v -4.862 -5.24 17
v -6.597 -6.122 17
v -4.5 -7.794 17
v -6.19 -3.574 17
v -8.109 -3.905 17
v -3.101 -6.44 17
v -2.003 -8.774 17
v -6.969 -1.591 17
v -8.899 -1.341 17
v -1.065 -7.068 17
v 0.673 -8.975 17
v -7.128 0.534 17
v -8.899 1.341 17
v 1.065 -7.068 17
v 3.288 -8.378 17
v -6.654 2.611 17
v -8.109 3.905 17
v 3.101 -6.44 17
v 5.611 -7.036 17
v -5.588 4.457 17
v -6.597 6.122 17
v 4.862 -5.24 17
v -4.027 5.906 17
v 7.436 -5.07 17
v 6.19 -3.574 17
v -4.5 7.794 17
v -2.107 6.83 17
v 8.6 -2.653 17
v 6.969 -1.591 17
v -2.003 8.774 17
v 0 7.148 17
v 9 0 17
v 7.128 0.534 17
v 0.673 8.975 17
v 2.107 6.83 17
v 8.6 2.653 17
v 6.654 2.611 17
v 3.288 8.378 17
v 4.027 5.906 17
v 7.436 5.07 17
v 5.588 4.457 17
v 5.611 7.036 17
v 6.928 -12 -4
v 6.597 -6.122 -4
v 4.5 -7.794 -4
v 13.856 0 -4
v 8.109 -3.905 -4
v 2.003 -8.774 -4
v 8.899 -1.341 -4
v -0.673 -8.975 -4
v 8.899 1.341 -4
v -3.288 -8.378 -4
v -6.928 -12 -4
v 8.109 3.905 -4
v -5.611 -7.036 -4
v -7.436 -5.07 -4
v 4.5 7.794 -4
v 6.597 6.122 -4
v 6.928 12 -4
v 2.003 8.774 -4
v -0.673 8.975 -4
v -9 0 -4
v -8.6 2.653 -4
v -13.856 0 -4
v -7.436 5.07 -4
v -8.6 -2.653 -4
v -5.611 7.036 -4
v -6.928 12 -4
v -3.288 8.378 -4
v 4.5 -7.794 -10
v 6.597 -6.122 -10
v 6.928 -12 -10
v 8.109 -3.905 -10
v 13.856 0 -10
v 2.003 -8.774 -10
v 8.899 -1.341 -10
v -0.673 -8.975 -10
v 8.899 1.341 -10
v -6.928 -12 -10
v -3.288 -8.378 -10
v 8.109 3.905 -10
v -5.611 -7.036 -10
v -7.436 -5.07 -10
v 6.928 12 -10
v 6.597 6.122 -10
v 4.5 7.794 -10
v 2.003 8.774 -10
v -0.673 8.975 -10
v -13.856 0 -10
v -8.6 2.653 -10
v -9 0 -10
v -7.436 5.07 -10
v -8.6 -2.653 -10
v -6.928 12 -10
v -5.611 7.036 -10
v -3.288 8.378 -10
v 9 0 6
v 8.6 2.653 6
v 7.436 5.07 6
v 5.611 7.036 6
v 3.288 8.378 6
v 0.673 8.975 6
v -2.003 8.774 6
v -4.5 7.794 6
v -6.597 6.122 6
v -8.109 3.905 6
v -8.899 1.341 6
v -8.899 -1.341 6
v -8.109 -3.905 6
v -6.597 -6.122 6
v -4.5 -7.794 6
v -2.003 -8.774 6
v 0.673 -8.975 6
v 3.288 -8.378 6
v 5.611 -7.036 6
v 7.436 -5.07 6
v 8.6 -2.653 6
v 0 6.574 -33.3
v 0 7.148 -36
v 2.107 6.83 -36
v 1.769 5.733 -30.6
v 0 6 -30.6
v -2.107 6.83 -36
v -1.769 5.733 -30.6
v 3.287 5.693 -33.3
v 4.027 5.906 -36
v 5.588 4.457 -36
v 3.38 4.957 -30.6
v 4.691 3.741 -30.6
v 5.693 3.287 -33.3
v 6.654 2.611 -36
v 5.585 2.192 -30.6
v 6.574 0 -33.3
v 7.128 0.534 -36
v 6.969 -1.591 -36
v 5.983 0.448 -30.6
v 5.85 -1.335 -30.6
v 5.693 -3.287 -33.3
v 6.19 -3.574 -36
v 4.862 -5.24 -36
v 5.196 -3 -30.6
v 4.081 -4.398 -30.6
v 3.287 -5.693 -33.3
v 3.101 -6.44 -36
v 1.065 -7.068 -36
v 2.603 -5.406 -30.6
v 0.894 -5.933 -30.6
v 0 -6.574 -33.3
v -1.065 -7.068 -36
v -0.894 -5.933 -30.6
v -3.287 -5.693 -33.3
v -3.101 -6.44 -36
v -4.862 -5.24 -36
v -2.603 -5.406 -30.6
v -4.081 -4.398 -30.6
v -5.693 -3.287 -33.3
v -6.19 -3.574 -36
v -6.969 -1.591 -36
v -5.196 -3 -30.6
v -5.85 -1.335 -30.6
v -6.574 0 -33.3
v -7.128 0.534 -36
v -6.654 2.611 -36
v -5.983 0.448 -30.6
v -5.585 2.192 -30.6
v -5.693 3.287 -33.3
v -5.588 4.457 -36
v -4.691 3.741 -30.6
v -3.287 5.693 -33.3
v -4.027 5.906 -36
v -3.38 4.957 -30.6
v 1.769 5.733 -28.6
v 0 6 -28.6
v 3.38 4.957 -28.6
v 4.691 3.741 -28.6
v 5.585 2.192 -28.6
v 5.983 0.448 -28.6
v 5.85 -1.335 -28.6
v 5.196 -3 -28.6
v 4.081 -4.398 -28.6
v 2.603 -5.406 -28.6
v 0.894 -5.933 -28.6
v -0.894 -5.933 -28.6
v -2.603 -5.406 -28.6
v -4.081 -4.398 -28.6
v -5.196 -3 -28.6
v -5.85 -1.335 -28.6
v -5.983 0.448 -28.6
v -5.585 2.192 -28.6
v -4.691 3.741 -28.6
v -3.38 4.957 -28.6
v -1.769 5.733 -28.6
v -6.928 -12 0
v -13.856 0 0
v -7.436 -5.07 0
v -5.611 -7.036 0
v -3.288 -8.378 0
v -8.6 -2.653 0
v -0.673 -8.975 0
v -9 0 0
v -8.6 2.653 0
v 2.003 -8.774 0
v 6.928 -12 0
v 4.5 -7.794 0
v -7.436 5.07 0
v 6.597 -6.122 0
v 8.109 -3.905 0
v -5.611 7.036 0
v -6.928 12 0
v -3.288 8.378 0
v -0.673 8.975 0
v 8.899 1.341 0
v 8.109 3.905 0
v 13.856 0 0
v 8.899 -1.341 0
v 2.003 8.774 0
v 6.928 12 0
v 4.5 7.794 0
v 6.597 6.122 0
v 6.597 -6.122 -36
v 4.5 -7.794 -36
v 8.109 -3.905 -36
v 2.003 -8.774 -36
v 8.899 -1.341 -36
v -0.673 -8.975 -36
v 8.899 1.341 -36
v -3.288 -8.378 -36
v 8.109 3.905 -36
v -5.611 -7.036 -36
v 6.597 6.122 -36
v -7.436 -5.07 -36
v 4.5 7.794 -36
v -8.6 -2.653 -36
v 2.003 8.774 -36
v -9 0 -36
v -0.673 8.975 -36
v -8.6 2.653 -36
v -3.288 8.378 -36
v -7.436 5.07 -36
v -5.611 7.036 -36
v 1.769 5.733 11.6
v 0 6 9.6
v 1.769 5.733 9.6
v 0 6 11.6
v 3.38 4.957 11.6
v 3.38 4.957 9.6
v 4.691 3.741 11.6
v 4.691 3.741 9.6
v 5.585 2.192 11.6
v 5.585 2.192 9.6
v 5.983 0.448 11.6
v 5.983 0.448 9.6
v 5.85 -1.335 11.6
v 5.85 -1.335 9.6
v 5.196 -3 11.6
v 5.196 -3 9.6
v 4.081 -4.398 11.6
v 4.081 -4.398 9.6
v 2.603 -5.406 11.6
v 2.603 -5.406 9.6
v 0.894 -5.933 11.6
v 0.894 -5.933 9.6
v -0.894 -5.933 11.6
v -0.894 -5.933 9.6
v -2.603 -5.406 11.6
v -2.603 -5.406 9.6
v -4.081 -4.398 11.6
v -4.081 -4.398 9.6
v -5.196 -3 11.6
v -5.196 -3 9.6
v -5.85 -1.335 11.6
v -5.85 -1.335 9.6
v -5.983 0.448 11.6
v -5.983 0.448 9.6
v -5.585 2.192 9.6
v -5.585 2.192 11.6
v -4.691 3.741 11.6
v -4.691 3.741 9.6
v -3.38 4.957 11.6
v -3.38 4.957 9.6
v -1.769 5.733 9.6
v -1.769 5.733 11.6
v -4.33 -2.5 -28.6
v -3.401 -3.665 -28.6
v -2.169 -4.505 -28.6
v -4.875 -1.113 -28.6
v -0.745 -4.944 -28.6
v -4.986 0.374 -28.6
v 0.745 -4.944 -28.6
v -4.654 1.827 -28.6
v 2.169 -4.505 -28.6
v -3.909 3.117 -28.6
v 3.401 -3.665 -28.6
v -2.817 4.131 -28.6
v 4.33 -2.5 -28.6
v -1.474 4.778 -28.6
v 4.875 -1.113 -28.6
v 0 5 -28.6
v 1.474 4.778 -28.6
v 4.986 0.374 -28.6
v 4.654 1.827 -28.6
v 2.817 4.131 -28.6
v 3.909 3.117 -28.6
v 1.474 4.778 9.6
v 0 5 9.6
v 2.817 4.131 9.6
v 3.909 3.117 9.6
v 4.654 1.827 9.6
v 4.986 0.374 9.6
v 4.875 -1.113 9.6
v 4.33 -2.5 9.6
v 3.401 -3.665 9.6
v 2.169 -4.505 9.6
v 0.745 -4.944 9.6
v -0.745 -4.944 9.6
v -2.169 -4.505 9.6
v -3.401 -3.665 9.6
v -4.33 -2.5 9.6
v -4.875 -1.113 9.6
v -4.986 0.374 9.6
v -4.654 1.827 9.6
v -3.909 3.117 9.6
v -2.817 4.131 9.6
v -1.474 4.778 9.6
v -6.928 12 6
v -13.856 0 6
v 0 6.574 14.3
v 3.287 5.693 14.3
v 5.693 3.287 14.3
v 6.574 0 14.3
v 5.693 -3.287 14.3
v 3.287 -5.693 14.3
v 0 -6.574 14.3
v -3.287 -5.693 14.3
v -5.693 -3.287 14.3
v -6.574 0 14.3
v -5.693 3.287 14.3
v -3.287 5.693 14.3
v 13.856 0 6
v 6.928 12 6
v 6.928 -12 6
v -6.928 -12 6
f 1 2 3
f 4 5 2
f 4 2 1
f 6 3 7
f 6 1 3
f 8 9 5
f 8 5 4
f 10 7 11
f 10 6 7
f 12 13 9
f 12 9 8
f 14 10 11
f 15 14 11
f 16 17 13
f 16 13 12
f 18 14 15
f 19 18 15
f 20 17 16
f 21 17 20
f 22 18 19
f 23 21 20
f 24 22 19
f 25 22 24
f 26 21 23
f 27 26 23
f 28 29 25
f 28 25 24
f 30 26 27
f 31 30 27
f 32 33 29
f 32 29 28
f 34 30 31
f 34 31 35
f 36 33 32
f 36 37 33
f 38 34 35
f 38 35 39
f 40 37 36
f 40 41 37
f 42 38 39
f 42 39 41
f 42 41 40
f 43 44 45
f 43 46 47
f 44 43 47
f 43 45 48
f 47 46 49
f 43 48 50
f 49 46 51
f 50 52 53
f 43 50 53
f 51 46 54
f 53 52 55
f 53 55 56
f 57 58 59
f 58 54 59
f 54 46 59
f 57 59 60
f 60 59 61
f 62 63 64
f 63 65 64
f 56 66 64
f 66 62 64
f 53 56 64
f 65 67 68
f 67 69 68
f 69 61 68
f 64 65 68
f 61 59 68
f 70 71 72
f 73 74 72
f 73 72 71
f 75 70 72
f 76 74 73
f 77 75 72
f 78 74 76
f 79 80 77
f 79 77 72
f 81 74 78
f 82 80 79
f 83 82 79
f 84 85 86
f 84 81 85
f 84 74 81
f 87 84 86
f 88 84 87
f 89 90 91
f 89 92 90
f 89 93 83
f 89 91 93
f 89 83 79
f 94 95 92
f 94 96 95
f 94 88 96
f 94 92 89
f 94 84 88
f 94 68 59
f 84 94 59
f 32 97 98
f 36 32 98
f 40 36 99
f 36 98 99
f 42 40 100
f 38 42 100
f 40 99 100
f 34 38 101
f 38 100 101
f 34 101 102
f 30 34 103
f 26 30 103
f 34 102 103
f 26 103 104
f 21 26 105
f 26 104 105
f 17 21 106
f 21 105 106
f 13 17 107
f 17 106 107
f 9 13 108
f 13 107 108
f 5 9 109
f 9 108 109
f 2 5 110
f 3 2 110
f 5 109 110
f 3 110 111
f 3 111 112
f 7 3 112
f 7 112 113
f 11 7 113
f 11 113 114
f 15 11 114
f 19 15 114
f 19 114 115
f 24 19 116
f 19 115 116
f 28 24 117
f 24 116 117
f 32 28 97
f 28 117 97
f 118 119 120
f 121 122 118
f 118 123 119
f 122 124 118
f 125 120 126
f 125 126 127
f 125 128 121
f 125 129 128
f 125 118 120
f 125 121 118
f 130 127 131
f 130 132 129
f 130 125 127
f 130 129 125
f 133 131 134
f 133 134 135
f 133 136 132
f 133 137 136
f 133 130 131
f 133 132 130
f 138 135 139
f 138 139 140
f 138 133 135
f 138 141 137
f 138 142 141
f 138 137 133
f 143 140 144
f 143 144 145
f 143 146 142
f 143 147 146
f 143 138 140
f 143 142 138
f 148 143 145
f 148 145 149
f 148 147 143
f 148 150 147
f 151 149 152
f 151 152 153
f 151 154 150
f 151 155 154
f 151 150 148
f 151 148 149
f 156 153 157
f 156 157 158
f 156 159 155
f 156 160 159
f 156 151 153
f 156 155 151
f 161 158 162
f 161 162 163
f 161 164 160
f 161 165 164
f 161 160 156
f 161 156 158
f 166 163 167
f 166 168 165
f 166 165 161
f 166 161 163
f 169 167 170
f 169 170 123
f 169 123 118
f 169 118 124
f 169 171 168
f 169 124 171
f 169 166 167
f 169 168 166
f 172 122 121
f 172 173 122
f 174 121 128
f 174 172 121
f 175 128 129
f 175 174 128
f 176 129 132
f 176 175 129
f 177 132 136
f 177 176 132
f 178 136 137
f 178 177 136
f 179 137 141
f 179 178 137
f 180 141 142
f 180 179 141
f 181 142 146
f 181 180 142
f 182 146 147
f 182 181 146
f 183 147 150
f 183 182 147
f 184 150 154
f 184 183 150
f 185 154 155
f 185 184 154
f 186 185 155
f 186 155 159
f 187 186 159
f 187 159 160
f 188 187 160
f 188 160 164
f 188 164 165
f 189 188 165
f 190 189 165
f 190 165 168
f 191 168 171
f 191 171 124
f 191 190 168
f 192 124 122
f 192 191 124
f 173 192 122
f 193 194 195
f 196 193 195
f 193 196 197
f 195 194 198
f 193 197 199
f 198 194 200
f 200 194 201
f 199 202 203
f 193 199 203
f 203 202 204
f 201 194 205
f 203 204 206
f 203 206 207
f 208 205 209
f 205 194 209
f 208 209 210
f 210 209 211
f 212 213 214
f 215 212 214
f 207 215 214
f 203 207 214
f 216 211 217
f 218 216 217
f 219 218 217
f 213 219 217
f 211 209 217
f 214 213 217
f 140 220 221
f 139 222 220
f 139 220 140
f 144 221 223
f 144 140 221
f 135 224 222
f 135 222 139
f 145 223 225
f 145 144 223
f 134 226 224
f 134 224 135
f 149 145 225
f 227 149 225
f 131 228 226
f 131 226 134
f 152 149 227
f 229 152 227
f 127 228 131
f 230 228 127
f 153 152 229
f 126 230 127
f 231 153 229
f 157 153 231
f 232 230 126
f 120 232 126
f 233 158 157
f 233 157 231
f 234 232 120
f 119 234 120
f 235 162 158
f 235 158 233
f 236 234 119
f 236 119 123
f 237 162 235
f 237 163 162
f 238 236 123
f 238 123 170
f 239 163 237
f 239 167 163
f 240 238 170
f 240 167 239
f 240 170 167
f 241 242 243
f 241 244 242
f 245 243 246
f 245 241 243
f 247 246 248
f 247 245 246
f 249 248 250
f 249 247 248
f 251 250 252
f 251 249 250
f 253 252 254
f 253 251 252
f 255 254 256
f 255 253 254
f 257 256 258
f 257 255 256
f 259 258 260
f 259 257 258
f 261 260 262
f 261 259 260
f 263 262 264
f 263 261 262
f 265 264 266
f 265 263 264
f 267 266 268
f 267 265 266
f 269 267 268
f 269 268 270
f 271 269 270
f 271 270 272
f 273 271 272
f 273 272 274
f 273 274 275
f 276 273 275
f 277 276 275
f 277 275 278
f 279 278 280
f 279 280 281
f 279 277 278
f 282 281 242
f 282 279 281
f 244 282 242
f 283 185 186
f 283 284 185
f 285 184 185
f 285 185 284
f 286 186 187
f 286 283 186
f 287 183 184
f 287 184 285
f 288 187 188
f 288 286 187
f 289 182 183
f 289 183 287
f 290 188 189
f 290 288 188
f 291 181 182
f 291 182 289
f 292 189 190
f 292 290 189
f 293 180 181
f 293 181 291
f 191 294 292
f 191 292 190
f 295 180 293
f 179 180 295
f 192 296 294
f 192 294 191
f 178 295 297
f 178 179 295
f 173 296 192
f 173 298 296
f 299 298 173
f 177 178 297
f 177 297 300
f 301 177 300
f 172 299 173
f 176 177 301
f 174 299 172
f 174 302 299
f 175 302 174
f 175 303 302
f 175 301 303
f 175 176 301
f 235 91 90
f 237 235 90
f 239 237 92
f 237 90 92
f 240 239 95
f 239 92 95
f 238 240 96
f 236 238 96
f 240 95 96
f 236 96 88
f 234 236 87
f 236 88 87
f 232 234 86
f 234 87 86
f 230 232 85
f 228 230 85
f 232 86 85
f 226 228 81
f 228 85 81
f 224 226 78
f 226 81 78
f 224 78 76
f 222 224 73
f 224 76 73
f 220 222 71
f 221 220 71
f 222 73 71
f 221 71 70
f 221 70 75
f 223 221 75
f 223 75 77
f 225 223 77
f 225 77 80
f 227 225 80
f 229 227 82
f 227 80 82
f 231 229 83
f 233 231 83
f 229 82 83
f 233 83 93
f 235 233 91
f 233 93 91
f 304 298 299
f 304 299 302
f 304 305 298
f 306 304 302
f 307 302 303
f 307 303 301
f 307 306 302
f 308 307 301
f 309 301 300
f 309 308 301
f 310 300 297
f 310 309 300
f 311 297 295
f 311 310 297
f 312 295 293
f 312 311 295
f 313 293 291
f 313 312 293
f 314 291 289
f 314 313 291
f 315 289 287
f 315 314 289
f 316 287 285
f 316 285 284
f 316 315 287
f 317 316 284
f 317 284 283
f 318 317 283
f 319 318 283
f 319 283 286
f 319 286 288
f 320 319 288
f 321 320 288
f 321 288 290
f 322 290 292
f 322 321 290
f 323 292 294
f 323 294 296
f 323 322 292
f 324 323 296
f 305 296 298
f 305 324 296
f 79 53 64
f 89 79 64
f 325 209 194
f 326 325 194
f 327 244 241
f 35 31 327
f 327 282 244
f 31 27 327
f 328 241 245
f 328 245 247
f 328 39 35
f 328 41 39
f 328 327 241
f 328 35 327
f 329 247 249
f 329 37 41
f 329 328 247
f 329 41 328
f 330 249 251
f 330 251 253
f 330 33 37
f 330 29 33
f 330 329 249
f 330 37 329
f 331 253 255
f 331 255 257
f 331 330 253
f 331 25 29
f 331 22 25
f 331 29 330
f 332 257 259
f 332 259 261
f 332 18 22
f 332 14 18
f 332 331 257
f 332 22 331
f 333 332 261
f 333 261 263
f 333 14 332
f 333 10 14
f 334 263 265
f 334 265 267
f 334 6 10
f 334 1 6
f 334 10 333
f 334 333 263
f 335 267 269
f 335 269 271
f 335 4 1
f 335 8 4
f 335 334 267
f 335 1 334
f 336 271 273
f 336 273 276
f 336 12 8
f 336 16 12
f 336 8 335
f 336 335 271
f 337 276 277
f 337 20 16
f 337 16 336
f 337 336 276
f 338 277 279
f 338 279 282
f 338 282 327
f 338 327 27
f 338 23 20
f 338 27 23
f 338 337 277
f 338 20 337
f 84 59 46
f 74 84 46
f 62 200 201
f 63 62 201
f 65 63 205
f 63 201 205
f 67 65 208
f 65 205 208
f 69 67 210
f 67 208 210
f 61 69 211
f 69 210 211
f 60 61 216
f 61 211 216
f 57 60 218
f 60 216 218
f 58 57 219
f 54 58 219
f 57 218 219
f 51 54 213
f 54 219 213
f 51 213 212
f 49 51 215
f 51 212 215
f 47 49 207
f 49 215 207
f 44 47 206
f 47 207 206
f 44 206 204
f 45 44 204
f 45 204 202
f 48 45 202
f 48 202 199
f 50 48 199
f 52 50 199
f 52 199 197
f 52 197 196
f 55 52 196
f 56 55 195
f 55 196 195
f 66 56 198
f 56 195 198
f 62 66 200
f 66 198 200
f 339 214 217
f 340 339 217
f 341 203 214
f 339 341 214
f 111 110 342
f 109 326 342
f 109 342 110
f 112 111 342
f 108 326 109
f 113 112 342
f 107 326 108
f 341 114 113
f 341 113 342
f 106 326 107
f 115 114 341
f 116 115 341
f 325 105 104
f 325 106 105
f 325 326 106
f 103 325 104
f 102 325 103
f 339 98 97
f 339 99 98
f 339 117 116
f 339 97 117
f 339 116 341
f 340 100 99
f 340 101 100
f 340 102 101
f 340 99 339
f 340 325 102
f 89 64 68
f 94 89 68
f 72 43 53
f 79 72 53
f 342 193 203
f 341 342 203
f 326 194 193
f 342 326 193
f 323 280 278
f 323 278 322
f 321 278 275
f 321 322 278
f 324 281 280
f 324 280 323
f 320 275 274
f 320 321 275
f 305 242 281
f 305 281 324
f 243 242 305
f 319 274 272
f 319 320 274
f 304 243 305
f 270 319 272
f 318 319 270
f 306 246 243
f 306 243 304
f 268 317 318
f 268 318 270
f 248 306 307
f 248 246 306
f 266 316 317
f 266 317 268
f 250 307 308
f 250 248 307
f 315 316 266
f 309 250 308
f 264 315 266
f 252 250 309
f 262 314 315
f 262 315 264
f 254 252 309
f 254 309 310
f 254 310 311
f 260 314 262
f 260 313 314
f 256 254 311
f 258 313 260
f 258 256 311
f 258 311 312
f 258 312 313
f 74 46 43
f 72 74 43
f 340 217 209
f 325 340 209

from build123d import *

# Parameters (mm, degrees)
BASE_EXTRUDE_DEPTH  = 6
SKETCH2_R           = 9
BOSS_EXTRUDE1_DEPTH = 11
SKETCH3_R           = 9
BOSS_EXTRUDE2_DEPTH = 4
BOSS_EXTRUDE3_DEPTH = 6
SKETCH5_R           = 9
BOSS_EXTRUDE4_DEPTH = 26


with BuildPart() as part:
    # Sketch1 → Base-Extrude (new body)
    with BuildSketch(Plane.XY):
        Polygon((13.856406461, 0), (6.92820323, 12), (-6.92820323, 12), (-13.856406461, 0), (-6.92820323, -12), (6.92820323, -12), align=None)
    extrude(amount=BASE_EXTRUDE_DEPTH)

    # Sketch2 → Boss-Extrude1 (add)
    with BuildSketch(Plane.XY.offset(6)):
        Circle(SKETCH2_R)
    extrude(amount=BOSS_EXTRUDE1_DEPTH)

    # Sketch3 → Boss-Extrude2 (add)
    with BuildSketch(Plane(origin=(0, 0, 0), x_dir=(-1, 0, 0), z_dir=(0, 0, -1))):
        Circle(SKETCH3_R)
    extrude(amount=BOSS_EXTRUDE2_DEPTH)

    # Sketch4 → Boss-Extrude3 (add)
    with BuildSketch(Plane(origin=(0, 0, -4), x_dir=(-1, 0, 0), z_dir=(0, 0, -1))):
        Polygon((13.856406461, 0), (6.92820323, 12), (-6.92820323, 12), (-13.856406461, 0), (-6.92820323, -12), (6.92820323, -12), align=None)
    extrude(amount=BOSS_EXTRUDE3_DEPTH)

    # Sketch5 → Boss-Extrude4 (add)
    with BuildSketch(Plane(origin=(0, 0, -10), x_dir=(-1, 0, 0), z_dir=(0, 0, -1))):
        Circle(SKETCH5_R)
    extrude(amount=BOSS_EXTRUDE4_DEPTH)

    # Sketch8 → Cut-Revolve1 (revolve, cut)
    with BuildSketch(Plane(origin=(0, 0, 0), x_dir=(0, 0, -1), z_dir=(1, 0, 0))):
        Polygon((36, 0), (36, 7.147805433), (30.6, 6), (28.6, 6), (28.6, 5), (-9.6, 5), (-9.6, 6), (-11.6, 6), (-17, 7.147805433), (-17, 0), align=None)
    revolve(axis=Axis((0, 0, 19), (0, 0, -1)), mode=Mode.SUBTRACT)


solid = part.part
